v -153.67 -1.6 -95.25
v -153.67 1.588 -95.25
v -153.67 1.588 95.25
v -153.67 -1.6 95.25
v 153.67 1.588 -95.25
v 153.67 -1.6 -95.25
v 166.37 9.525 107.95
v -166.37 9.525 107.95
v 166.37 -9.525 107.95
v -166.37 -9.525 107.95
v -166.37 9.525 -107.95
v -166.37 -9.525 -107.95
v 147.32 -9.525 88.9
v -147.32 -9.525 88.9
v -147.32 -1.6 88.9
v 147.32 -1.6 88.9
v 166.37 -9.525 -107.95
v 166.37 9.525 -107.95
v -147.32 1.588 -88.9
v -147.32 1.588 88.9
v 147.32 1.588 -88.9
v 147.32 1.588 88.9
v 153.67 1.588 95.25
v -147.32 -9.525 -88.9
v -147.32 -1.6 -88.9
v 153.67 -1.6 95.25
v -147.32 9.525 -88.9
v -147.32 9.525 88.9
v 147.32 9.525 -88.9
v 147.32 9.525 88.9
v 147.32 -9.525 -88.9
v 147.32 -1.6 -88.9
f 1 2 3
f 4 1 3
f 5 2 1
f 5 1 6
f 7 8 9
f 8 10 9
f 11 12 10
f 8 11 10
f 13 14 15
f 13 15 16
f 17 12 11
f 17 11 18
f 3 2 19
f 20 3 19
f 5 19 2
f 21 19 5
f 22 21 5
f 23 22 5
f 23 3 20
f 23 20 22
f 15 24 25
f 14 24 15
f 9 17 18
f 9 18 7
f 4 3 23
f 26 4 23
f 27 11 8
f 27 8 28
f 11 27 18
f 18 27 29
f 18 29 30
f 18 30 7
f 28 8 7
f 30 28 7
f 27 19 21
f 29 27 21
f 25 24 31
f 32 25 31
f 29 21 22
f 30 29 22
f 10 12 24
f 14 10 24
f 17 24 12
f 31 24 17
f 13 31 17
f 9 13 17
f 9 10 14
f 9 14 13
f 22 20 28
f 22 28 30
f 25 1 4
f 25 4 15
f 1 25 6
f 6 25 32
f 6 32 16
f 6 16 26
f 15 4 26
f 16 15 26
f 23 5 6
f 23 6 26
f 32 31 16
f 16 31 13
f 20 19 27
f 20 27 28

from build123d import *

# Parameters (mm, degrees)
F0_W          = 332.74
F0_H          = 215.9
F0_W_2        = 294.64
F0_H_2        = 177.8
F1_DEPTH      = 9.525
F1_DEPTH_BACK = 9.525
F2_W          = 307.34
F2_H          = 190.5
F3_DEPTH      = 0.0625
F3_DEPTH_BACK = 1.6002


# Not quite as in the source:
# - a pattern or mirror of a feature is missing from the dataset's text; its kind, count and spacing are read off the source's solid


with BuildPart() as f1:
    # F0 (on Front) → F1 (new body, two sides)
    with BuildSketch(Plane.XZ) as f1_sk:
        Rectangle(F0_W, F0_H)
        Rectangle(F0_W_2, F0_H_2, mode=Mode.SUBTRACT)
    extrude(amount=F1_DEPTH)
    extrude(f1_sk.sketch, amount=-F1_DEPTH_BACK)

    # F2 (on Front) → F3 (cut, two sides)
    with BuildSketch(Plane.XZ) as f3_sk:
        Rectangle(F2_W, F2_H)
    f3 = extrude(amount=-F3_DEPTH, mode=Mode.SUBTRACT) + extrude(f3_sk.sketch, amount=F3_DEPTH_BACK, mode=Mode.SUBTRACT)

    # F3_copies: F3 across plane
    add(f3.mirror(Plane.ZX.offset(-0.00635)), mode=Mode.SUBTRACT)


solid = f1.part
